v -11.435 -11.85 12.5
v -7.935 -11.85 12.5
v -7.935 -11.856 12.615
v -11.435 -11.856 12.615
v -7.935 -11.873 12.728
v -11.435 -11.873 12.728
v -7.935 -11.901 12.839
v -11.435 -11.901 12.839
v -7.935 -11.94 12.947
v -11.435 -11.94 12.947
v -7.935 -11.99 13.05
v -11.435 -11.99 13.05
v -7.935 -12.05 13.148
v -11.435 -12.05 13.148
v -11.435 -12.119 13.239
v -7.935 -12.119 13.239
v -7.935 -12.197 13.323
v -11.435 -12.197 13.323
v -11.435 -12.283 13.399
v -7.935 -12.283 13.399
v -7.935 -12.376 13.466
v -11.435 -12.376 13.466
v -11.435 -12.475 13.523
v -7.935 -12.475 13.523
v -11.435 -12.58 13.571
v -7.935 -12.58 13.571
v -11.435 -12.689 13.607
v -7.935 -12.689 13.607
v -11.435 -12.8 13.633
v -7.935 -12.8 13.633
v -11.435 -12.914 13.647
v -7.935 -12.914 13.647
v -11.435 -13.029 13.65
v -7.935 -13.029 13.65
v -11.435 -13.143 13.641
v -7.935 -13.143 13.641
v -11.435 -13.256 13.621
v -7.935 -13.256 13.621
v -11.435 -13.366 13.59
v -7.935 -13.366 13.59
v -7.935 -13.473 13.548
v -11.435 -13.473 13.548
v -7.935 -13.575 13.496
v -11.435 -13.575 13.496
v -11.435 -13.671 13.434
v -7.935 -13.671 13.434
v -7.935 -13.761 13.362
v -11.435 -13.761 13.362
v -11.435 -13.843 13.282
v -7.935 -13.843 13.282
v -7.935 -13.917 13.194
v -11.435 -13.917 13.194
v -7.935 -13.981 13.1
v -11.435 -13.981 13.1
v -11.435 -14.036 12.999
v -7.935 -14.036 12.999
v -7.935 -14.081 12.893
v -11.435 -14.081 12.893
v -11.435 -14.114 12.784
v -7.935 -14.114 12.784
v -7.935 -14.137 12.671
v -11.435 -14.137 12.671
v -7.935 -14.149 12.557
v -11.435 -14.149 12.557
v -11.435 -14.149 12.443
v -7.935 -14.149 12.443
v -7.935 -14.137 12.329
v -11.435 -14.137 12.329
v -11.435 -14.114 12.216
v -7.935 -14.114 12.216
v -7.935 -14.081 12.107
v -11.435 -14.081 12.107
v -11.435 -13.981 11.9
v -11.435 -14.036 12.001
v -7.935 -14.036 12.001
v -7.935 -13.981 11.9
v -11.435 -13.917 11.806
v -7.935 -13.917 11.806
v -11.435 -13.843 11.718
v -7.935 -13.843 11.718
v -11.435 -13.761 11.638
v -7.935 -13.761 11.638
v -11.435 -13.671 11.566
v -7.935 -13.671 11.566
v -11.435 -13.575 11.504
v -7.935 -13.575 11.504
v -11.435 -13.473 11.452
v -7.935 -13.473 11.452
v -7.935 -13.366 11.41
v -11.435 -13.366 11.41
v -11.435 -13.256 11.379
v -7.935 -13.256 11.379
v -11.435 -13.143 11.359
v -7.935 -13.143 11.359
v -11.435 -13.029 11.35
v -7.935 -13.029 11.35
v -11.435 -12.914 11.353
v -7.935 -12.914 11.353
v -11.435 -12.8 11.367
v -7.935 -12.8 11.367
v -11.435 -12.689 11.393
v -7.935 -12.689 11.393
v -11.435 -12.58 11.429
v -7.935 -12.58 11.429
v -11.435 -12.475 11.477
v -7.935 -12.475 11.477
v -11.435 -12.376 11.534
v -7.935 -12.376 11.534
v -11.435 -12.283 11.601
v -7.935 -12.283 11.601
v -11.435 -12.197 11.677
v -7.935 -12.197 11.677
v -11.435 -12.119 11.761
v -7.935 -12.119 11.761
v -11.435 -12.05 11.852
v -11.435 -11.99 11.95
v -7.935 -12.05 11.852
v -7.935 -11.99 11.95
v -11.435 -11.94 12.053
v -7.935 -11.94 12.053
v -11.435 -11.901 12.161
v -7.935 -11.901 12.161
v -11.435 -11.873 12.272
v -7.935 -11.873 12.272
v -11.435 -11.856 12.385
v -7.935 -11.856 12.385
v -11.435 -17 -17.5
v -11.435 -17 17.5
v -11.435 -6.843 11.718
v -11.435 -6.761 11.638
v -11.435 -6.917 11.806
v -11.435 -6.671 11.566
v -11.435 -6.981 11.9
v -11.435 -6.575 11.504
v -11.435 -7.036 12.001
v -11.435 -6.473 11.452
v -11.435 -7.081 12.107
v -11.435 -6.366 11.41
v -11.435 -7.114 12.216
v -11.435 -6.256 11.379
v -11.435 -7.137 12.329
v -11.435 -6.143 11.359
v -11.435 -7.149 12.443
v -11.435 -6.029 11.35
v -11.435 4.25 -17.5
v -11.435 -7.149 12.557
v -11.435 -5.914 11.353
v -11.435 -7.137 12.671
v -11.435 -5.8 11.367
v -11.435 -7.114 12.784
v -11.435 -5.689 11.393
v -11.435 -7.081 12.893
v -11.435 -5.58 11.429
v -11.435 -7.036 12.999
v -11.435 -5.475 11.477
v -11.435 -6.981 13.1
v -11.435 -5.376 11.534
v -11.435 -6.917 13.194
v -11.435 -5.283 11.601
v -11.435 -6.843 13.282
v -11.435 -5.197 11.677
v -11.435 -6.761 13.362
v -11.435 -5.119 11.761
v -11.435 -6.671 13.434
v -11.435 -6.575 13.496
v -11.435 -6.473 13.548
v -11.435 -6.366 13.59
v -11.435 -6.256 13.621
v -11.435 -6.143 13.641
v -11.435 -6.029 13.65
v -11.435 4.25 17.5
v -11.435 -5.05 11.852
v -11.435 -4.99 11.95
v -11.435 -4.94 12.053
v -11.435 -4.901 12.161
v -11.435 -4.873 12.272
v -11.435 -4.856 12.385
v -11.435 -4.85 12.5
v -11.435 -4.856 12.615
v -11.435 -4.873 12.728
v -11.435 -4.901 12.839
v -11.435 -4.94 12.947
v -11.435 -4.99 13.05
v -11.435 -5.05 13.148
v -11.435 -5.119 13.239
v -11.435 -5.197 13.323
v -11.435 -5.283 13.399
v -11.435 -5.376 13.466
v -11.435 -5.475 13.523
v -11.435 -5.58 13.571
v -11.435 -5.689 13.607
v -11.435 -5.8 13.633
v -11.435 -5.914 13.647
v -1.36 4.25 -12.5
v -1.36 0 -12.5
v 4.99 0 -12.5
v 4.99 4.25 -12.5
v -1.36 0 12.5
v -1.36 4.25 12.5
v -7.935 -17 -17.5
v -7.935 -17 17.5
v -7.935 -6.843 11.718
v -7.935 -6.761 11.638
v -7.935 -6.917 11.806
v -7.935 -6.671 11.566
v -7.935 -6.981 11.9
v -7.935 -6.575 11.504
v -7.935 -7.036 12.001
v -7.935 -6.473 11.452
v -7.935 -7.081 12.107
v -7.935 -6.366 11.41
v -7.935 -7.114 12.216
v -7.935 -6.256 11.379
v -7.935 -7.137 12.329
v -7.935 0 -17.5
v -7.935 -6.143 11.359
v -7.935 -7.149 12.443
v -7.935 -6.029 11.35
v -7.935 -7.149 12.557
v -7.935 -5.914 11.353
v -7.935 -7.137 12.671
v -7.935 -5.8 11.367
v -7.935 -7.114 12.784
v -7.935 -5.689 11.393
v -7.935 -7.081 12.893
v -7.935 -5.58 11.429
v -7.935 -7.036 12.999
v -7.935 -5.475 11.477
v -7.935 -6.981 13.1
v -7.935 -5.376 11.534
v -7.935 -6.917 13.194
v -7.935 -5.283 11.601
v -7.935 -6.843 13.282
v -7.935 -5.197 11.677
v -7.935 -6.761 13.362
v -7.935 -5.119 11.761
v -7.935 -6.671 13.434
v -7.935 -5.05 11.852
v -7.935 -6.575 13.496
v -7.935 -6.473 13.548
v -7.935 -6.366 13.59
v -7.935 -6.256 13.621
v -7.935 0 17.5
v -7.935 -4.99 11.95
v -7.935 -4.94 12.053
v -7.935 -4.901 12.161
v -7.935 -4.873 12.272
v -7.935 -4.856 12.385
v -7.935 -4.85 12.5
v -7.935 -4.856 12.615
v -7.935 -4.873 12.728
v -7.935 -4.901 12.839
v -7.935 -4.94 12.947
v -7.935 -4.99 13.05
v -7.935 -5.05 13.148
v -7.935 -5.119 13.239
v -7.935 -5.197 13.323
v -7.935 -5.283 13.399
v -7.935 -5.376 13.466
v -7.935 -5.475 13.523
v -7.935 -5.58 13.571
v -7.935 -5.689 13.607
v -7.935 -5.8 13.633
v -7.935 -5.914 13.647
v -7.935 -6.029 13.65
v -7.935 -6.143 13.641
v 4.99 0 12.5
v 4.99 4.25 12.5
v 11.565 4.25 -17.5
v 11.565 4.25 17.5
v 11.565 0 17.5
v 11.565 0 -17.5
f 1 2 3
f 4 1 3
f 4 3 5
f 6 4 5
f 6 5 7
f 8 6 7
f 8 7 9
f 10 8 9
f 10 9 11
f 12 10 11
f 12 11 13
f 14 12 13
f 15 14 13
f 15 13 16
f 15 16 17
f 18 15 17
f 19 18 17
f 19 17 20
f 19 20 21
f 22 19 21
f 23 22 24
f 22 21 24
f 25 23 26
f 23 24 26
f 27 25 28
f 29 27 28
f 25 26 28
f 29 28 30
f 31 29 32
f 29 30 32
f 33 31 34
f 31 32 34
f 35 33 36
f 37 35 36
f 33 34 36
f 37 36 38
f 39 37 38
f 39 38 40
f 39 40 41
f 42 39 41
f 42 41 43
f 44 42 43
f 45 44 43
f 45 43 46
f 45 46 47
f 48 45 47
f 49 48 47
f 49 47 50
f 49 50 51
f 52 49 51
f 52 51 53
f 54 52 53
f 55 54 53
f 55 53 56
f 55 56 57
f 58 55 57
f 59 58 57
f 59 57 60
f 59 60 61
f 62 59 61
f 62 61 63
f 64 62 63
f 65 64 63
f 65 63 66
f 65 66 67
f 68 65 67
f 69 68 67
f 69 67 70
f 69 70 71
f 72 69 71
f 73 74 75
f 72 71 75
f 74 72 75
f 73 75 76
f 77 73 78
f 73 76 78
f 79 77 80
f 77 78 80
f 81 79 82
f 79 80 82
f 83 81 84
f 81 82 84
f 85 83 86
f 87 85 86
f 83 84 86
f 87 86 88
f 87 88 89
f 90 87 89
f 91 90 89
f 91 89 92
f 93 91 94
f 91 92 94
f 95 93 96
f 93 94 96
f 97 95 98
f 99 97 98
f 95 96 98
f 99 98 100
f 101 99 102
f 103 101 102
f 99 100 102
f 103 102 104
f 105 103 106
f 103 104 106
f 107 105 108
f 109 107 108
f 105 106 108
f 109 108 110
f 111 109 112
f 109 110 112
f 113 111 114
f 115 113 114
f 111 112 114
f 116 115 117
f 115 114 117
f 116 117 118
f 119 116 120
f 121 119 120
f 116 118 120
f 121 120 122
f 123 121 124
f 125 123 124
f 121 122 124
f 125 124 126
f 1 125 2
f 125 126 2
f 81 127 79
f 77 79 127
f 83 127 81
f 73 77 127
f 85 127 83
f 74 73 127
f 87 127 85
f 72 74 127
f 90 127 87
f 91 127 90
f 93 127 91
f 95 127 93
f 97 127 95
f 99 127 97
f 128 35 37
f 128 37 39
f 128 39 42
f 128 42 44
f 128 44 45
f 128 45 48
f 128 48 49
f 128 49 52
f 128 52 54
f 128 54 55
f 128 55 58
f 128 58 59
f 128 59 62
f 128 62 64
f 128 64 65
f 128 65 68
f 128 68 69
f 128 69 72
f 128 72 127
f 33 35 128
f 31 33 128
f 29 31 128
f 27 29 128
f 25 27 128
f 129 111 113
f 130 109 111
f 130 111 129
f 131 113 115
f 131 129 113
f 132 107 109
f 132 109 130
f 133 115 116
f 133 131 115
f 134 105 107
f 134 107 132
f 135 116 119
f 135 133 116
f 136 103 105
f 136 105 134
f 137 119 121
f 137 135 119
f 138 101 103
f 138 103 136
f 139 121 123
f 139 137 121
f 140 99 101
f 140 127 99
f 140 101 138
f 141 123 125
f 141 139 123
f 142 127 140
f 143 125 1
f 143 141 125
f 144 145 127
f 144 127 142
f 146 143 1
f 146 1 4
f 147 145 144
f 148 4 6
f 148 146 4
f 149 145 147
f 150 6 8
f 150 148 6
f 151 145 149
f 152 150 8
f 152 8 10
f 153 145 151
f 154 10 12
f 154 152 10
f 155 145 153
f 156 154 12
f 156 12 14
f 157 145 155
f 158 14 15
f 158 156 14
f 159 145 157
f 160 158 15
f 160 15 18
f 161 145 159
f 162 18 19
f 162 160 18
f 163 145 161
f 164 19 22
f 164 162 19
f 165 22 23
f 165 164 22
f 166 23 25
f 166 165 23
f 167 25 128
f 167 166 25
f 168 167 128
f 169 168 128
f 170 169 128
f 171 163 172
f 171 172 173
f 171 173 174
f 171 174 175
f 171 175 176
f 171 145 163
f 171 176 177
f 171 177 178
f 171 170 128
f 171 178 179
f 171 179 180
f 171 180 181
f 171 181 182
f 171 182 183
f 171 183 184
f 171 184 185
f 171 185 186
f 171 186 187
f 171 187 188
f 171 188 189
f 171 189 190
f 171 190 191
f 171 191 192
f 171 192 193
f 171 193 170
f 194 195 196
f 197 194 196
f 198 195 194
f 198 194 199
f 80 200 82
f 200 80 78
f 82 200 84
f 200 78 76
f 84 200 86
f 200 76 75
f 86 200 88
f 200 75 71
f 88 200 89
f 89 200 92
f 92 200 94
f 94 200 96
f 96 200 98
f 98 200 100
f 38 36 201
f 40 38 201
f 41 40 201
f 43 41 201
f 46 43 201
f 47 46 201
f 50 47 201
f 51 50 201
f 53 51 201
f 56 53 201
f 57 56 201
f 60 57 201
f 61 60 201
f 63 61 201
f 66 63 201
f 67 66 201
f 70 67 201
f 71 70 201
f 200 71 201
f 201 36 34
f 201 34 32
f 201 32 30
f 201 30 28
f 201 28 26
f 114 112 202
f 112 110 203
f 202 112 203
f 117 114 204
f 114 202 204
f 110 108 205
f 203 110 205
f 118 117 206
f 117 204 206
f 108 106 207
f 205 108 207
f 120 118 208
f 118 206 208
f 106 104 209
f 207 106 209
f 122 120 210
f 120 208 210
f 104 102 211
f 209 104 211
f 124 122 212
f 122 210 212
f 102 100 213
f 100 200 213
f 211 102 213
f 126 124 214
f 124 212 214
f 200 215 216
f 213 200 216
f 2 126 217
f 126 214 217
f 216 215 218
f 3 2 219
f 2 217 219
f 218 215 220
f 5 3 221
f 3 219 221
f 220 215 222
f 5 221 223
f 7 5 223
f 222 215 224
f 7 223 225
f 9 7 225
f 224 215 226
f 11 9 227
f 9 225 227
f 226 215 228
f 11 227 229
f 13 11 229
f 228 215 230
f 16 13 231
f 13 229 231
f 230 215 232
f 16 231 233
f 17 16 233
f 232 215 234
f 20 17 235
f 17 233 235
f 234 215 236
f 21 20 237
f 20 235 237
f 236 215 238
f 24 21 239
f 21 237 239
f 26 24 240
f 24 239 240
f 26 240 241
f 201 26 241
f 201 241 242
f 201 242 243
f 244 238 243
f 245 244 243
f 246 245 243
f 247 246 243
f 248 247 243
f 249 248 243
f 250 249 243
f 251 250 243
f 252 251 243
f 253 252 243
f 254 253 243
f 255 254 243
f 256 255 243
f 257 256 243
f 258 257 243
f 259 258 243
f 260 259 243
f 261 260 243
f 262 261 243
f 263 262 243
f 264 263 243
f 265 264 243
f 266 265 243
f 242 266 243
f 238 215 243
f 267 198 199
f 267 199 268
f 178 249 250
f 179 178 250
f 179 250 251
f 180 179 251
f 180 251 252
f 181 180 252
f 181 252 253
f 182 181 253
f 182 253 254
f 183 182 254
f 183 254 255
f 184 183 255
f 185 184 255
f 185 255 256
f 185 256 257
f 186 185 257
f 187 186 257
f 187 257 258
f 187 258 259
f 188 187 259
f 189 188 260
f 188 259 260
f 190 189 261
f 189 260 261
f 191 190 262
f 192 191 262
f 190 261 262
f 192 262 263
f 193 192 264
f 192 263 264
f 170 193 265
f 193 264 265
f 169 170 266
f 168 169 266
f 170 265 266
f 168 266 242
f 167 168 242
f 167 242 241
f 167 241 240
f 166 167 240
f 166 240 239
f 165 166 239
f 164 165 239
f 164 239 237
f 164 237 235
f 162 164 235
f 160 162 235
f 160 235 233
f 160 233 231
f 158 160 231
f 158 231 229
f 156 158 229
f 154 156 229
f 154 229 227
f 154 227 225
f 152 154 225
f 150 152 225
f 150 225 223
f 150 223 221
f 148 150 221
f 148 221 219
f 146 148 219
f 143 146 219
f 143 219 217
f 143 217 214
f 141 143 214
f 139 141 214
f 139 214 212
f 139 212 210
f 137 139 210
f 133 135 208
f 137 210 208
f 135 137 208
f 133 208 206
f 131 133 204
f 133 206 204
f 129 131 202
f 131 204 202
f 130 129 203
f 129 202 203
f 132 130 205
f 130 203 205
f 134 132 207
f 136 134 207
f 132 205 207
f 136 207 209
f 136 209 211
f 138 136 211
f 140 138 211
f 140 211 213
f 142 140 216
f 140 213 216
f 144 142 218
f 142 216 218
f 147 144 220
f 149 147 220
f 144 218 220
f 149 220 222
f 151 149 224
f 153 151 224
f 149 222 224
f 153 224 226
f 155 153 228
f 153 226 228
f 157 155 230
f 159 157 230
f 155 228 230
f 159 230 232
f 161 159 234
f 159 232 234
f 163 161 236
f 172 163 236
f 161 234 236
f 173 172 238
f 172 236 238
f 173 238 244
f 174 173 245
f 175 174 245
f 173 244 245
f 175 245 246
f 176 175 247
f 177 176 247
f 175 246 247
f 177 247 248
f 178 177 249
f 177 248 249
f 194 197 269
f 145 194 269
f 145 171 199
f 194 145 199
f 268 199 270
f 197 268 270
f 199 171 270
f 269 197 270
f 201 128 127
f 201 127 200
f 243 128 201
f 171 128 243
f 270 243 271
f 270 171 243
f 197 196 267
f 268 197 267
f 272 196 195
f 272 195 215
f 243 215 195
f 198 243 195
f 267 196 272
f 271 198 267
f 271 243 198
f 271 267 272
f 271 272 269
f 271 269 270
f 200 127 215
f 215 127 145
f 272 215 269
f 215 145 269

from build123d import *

# Parameters (mm, degrees)
F0_W     = 23
F0_H     = 35
F1_DEPTH = 4.25
F2_W     = 3.5
F2_H     = 35
F3_DEPTH = 17
F4_W     = 6.35
F4_H     = 25
F5_DEPTH = 4.251
F6_R     = 1.15
F7_DEPTH = 3.501


with BuildPart() as f1:
    # F0 (on Front) → F1 (new body)
    with BuildSketch(Plane.XZ):
        with Locations((0.065487, 0)):
            Rectangle(F0_W, F0_H)
    extrude(amount=-F1_DEPTH)

    # F2 (on face) → F3 (join)
    with BuildSketch(Plane.XZ):
        with Locations((-9.684513, 0)):
            Rectangle(F2_W, F2_H)
    extrude(amount=F3_DEPTH)

    # F4 (on face) → F5 (cut, through all)
    with BuildSketch(Plane.XZ):
        with Locations((1.815487, 0)):
            Rectangle(F4_W, F4_H)
    extrude(amount=-F5_DEPTH, mode=Mode.SUBTRACT)

    # F6 (on face) → F7 (cut, through all)
    with BuildSketch(Plane.YZ.offset(-7.934513)):
        with Locations((-13, 12.5)):
            Circle(F6_R)
        with Locations((-6, 12.5)):
            Circle(F6_R)
    extrude(amount=-F7_DEPTH, mode=Mode.SUBTRACT)


solid = f1.part
